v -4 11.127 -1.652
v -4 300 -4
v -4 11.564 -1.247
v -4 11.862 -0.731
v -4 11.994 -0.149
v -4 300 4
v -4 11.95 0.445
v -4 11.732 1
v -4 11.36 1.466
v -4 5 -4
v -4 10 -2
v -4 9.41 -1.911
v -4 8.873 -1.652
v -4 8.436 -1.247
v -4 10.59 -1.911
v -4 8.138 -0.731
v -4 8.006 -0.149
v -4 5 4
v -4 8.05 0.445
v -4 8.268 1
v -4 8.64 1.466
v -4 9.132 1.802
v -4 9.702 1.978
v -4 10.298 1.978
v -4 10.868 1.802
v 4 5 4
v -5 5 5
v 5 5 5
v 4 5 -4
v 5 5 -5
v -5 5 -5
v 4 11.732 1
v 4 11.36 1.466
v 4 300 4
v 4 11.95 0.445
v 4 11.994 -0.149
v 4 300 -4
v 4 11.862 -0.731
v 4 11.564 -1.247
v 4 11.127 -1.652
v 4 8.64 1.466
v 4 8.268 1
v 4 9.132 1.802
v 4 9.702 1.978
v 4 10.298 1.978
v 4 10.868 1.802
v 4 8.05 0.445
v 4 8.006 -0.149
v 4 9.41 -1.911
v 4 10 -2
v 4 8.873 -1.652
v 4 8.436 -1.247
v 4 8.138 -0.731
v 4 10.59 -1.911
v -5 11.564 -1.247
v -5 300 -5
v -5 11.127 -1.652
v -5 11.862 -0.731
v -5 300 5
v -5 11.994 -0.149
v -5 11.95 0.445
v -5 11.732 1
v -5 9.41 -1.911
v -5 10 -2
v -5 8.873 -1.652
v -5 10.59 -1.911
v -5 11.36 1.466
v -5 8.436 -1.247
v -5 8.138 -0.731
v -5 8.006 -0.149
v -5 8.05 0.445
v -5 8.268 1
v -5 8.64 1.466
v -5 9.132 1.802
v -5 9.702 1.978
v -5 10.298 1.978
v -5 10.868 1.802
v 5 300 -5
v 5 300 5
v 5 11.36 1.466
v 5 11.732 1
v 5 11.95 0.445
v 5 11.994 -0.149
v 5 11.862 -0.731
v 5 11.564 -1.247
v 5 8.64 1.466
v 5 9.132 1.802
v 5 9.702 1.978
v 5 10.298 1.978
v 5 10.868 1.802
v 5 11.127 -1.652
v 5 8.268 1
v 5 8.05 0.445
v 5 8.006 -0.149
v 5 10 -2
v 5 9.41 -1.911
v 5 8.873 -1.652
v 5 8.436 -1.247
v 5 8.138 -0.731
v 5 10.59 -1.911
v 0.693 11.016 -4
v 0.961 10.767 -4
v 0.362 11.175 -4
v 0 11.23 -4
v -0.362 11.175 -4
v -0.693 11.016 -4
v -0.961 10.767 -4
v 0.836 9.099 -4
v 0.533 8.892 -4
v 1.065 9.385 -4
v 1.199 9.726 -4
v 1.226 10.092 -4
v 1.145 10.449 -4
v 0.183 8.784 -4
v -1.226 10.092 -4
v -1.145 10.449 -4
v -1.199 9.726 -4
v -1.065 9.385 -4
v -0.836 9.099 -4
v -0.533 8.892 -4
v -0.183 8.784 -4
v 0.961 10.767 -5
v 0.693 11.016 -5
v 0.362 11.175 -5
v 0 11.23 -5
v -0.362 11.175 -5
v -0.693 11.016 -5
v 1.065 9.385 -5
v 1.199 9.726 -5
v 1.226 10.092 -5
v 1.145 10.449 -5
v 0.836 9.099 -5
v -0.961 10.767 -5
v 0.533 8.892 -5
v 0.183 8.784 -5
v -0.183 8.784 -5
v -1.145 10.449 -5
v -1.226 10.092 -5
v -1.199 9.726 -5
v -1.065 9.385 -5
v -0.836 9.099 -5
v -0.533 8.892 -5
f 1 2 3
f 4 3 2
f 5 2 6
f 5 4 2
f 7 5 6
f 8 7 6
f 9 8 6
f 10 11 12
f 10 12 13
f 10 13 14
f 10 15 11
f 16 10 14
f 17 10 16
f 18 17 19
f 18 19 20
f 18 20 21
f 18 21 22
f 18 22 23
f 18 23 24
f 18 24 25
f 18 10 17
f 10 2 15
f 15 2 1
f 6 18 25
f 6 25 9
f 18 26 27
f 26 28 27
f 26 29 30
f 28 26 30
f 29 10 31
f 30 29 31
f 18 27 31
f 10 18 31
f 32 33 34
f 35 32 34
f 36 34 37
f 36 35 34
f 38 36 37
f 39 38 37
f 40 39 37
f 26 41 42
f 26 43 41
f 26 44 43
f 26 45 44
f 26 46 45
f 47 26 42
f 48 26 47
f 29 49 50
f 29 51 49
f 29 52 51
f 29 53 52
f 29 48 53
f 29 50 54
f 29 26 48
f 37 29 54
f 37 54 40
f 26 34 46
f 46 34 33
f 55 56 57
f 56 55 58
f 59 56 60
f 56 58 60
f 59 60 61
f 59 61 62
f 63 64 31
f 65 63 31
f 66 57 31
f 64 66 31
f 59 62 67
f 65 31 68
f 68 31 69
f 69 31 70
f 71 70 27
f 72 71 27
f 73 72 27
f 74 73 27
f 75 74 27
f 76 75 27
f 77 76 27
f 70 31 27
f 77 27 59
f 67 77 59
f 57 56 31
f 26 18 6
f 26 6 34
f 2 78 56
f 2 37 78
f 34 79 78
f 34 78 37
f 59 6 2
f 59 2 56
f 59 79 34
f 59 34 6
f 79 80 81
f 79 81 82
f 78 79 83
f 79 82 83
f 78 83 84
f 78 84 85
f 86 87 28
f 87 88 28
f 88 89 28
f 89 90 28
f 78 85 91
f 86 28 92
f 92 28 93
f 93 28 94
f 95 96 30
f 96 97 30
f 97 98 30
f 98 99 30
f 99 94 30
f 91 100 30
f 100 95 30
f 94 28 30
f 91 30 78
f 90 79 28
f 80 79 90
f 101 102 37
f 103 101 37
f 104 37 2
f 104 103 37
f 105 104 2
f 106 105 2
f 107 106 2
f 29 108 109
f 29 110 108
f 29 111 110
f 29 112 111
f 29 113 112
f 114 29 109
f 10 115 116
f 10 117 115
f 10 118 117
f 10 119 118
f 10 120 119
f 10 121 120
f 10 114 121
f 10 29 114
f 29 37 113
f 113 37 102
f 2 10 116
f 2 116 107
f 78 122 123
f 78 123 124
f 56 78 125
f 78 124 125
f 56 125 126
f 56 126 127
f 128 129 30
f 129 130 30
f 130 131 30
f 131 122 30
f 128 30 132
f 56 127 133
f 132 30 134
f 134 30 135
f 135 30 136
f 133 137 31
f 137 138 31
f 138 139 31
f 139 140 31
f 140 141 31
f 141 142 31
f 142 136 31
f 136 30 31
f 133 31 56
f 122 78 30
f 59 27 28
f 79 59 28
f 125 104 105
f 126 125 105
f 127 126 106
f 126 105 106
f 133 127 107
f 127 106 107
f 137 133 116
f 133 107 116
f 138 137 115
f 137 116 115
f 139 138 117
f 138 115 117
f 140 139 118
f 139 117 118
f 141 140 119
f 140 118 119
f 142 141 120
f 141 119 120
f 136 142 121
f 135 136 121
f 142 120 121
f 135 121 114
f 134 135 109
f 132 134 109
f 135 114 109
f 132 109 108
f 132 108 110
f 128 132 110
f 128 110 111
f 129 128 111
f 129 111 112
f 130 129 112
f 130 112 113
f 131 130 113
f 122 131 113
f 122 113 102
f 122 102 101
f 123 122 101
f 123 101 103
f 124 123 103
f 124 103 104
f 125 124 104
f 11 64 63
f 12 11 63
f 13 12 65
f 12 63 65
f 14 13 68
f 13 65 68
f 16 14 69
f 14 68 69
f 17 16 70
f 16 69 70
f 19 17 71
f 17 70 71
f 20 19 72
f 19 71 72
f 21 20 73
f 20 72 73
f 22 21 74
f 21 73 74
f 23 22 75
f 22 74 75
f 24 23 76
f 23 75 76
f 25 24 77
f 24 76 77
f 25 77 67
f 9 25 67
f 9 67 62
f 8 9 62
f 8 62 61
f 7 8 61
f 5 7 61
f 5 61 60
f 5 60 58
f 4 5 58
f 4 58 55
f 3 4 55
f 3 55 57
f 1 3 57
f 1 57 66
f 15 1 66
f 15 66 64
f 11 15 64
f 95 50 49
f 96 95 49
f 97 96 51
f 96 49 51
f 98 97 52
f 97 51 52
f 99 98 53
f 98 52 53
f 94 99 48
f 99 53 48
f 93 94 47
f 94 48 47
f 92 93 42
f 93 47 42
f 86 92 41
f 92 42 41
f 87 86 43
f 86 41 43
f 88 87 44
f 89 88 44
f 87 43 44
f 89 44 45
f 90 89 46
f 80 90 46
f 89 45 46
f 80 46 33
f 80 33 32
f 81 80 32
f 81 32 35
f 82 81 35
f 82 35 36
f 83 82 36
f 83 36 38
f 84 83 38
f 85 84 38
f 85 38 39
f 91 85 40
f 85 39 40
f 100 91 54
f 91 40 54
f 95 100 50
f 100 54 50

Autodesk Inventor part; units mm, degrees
ref_plane "YZ Plane" through (0, 0, 0) normal (1, 0, 0) x (0, 1, 0)
ref_plane "XZ Plane" through (0, 0, 0) normal (0, 1, 0) x (-1, 0, 0)
sketch "スケッチ1" plane through (0, 0, 0) normal (0, 1, 0) x (-1, 0, 0)
  line L0 (5, 5) -> (-5, 5)
  line L1 (-5, 5) -> (-5, -5)
  line L2 (-5, -5) -> (5, -5)
  line L3 (5, -5) -> (5, 5)
  line L4 (4, 4) -> (-4, 4)
  line L5 (-4, 4) -> (-4, -4)
  line L6 (-4, -4) -> (4, -4)
  line L7 (4, -4) -> (4, 4)
  line L8 (5, 5) -> (-5, -5) construction
  line L9 (-5, 5) -> (5, -5) construction
  point P0 (0, 0)
  point P1 (0, 0)
  point P2 (0, 0)
  dimension "d0" = 10
  dimension "d1" = 10
  dimension "d2" = 1
extrude "押し出し1" add sketch "スケッチ1" along normal blind 300
sketch "スケッチ2" plane through (5, 0, 5) normal (1, 0, 0) x (0, 0, -1)
  line L0 (0, 0) -> (10, 0) projected
  point P0 (5, 0)
  point P1 (5, 10)
  point P2 (5, 0)
  dimension "d5" = 10
hole "穴1" at (5, 10, 0) direction (-1, 0, 0) diameter 4 depth 10
ref_plane "作業平面1" through (0, 0, 5) normal (1, 0, 0) x (0, 0, -1)
sketch "スケッチ3" plane through (-5, 0, -5) normal (-1, 0, 0) x (0, 0, 1)
  line L0 (10, 0) -> (10, 300) projected
  line L1 (0, 0) -> (10, 0)
  line L2 (10, 0) -> (10, 5)
  line L3 (10, 5) -> (0, 5)
  line L4 (0, 5) -> (0, 0)
  point P0 (5, 0)
  dimension "d13" = 5
extrude "押し出し2" cut sketch "スケッチ3" against normal blind 25.4
sketch "スケッチ5" plane through (5, 300, -5) normal (0, 0, -1) x (-1, 0, 0)
  line L0 (0, -295) -> (0, 0) projected
  line L1 (0, -295) -> (10, -295) projected
  point P0 (5, -300)
  point P1 (5, -290)
  dimension "d16" = 5
  dimension "d17" = 5
hole "穴2" at (0, 10, -5) direction (0, 0, 1) diameter 2.459 depth 1 thread size "M3x0.5" class "6H" standard "ISO Metric profile"
ref_plane "作業平面3" through (-5, 300, 0) normal (0, 0, 1) x (1, 0, 0)
properties part number "stick" material "アルミニウム 6061"
